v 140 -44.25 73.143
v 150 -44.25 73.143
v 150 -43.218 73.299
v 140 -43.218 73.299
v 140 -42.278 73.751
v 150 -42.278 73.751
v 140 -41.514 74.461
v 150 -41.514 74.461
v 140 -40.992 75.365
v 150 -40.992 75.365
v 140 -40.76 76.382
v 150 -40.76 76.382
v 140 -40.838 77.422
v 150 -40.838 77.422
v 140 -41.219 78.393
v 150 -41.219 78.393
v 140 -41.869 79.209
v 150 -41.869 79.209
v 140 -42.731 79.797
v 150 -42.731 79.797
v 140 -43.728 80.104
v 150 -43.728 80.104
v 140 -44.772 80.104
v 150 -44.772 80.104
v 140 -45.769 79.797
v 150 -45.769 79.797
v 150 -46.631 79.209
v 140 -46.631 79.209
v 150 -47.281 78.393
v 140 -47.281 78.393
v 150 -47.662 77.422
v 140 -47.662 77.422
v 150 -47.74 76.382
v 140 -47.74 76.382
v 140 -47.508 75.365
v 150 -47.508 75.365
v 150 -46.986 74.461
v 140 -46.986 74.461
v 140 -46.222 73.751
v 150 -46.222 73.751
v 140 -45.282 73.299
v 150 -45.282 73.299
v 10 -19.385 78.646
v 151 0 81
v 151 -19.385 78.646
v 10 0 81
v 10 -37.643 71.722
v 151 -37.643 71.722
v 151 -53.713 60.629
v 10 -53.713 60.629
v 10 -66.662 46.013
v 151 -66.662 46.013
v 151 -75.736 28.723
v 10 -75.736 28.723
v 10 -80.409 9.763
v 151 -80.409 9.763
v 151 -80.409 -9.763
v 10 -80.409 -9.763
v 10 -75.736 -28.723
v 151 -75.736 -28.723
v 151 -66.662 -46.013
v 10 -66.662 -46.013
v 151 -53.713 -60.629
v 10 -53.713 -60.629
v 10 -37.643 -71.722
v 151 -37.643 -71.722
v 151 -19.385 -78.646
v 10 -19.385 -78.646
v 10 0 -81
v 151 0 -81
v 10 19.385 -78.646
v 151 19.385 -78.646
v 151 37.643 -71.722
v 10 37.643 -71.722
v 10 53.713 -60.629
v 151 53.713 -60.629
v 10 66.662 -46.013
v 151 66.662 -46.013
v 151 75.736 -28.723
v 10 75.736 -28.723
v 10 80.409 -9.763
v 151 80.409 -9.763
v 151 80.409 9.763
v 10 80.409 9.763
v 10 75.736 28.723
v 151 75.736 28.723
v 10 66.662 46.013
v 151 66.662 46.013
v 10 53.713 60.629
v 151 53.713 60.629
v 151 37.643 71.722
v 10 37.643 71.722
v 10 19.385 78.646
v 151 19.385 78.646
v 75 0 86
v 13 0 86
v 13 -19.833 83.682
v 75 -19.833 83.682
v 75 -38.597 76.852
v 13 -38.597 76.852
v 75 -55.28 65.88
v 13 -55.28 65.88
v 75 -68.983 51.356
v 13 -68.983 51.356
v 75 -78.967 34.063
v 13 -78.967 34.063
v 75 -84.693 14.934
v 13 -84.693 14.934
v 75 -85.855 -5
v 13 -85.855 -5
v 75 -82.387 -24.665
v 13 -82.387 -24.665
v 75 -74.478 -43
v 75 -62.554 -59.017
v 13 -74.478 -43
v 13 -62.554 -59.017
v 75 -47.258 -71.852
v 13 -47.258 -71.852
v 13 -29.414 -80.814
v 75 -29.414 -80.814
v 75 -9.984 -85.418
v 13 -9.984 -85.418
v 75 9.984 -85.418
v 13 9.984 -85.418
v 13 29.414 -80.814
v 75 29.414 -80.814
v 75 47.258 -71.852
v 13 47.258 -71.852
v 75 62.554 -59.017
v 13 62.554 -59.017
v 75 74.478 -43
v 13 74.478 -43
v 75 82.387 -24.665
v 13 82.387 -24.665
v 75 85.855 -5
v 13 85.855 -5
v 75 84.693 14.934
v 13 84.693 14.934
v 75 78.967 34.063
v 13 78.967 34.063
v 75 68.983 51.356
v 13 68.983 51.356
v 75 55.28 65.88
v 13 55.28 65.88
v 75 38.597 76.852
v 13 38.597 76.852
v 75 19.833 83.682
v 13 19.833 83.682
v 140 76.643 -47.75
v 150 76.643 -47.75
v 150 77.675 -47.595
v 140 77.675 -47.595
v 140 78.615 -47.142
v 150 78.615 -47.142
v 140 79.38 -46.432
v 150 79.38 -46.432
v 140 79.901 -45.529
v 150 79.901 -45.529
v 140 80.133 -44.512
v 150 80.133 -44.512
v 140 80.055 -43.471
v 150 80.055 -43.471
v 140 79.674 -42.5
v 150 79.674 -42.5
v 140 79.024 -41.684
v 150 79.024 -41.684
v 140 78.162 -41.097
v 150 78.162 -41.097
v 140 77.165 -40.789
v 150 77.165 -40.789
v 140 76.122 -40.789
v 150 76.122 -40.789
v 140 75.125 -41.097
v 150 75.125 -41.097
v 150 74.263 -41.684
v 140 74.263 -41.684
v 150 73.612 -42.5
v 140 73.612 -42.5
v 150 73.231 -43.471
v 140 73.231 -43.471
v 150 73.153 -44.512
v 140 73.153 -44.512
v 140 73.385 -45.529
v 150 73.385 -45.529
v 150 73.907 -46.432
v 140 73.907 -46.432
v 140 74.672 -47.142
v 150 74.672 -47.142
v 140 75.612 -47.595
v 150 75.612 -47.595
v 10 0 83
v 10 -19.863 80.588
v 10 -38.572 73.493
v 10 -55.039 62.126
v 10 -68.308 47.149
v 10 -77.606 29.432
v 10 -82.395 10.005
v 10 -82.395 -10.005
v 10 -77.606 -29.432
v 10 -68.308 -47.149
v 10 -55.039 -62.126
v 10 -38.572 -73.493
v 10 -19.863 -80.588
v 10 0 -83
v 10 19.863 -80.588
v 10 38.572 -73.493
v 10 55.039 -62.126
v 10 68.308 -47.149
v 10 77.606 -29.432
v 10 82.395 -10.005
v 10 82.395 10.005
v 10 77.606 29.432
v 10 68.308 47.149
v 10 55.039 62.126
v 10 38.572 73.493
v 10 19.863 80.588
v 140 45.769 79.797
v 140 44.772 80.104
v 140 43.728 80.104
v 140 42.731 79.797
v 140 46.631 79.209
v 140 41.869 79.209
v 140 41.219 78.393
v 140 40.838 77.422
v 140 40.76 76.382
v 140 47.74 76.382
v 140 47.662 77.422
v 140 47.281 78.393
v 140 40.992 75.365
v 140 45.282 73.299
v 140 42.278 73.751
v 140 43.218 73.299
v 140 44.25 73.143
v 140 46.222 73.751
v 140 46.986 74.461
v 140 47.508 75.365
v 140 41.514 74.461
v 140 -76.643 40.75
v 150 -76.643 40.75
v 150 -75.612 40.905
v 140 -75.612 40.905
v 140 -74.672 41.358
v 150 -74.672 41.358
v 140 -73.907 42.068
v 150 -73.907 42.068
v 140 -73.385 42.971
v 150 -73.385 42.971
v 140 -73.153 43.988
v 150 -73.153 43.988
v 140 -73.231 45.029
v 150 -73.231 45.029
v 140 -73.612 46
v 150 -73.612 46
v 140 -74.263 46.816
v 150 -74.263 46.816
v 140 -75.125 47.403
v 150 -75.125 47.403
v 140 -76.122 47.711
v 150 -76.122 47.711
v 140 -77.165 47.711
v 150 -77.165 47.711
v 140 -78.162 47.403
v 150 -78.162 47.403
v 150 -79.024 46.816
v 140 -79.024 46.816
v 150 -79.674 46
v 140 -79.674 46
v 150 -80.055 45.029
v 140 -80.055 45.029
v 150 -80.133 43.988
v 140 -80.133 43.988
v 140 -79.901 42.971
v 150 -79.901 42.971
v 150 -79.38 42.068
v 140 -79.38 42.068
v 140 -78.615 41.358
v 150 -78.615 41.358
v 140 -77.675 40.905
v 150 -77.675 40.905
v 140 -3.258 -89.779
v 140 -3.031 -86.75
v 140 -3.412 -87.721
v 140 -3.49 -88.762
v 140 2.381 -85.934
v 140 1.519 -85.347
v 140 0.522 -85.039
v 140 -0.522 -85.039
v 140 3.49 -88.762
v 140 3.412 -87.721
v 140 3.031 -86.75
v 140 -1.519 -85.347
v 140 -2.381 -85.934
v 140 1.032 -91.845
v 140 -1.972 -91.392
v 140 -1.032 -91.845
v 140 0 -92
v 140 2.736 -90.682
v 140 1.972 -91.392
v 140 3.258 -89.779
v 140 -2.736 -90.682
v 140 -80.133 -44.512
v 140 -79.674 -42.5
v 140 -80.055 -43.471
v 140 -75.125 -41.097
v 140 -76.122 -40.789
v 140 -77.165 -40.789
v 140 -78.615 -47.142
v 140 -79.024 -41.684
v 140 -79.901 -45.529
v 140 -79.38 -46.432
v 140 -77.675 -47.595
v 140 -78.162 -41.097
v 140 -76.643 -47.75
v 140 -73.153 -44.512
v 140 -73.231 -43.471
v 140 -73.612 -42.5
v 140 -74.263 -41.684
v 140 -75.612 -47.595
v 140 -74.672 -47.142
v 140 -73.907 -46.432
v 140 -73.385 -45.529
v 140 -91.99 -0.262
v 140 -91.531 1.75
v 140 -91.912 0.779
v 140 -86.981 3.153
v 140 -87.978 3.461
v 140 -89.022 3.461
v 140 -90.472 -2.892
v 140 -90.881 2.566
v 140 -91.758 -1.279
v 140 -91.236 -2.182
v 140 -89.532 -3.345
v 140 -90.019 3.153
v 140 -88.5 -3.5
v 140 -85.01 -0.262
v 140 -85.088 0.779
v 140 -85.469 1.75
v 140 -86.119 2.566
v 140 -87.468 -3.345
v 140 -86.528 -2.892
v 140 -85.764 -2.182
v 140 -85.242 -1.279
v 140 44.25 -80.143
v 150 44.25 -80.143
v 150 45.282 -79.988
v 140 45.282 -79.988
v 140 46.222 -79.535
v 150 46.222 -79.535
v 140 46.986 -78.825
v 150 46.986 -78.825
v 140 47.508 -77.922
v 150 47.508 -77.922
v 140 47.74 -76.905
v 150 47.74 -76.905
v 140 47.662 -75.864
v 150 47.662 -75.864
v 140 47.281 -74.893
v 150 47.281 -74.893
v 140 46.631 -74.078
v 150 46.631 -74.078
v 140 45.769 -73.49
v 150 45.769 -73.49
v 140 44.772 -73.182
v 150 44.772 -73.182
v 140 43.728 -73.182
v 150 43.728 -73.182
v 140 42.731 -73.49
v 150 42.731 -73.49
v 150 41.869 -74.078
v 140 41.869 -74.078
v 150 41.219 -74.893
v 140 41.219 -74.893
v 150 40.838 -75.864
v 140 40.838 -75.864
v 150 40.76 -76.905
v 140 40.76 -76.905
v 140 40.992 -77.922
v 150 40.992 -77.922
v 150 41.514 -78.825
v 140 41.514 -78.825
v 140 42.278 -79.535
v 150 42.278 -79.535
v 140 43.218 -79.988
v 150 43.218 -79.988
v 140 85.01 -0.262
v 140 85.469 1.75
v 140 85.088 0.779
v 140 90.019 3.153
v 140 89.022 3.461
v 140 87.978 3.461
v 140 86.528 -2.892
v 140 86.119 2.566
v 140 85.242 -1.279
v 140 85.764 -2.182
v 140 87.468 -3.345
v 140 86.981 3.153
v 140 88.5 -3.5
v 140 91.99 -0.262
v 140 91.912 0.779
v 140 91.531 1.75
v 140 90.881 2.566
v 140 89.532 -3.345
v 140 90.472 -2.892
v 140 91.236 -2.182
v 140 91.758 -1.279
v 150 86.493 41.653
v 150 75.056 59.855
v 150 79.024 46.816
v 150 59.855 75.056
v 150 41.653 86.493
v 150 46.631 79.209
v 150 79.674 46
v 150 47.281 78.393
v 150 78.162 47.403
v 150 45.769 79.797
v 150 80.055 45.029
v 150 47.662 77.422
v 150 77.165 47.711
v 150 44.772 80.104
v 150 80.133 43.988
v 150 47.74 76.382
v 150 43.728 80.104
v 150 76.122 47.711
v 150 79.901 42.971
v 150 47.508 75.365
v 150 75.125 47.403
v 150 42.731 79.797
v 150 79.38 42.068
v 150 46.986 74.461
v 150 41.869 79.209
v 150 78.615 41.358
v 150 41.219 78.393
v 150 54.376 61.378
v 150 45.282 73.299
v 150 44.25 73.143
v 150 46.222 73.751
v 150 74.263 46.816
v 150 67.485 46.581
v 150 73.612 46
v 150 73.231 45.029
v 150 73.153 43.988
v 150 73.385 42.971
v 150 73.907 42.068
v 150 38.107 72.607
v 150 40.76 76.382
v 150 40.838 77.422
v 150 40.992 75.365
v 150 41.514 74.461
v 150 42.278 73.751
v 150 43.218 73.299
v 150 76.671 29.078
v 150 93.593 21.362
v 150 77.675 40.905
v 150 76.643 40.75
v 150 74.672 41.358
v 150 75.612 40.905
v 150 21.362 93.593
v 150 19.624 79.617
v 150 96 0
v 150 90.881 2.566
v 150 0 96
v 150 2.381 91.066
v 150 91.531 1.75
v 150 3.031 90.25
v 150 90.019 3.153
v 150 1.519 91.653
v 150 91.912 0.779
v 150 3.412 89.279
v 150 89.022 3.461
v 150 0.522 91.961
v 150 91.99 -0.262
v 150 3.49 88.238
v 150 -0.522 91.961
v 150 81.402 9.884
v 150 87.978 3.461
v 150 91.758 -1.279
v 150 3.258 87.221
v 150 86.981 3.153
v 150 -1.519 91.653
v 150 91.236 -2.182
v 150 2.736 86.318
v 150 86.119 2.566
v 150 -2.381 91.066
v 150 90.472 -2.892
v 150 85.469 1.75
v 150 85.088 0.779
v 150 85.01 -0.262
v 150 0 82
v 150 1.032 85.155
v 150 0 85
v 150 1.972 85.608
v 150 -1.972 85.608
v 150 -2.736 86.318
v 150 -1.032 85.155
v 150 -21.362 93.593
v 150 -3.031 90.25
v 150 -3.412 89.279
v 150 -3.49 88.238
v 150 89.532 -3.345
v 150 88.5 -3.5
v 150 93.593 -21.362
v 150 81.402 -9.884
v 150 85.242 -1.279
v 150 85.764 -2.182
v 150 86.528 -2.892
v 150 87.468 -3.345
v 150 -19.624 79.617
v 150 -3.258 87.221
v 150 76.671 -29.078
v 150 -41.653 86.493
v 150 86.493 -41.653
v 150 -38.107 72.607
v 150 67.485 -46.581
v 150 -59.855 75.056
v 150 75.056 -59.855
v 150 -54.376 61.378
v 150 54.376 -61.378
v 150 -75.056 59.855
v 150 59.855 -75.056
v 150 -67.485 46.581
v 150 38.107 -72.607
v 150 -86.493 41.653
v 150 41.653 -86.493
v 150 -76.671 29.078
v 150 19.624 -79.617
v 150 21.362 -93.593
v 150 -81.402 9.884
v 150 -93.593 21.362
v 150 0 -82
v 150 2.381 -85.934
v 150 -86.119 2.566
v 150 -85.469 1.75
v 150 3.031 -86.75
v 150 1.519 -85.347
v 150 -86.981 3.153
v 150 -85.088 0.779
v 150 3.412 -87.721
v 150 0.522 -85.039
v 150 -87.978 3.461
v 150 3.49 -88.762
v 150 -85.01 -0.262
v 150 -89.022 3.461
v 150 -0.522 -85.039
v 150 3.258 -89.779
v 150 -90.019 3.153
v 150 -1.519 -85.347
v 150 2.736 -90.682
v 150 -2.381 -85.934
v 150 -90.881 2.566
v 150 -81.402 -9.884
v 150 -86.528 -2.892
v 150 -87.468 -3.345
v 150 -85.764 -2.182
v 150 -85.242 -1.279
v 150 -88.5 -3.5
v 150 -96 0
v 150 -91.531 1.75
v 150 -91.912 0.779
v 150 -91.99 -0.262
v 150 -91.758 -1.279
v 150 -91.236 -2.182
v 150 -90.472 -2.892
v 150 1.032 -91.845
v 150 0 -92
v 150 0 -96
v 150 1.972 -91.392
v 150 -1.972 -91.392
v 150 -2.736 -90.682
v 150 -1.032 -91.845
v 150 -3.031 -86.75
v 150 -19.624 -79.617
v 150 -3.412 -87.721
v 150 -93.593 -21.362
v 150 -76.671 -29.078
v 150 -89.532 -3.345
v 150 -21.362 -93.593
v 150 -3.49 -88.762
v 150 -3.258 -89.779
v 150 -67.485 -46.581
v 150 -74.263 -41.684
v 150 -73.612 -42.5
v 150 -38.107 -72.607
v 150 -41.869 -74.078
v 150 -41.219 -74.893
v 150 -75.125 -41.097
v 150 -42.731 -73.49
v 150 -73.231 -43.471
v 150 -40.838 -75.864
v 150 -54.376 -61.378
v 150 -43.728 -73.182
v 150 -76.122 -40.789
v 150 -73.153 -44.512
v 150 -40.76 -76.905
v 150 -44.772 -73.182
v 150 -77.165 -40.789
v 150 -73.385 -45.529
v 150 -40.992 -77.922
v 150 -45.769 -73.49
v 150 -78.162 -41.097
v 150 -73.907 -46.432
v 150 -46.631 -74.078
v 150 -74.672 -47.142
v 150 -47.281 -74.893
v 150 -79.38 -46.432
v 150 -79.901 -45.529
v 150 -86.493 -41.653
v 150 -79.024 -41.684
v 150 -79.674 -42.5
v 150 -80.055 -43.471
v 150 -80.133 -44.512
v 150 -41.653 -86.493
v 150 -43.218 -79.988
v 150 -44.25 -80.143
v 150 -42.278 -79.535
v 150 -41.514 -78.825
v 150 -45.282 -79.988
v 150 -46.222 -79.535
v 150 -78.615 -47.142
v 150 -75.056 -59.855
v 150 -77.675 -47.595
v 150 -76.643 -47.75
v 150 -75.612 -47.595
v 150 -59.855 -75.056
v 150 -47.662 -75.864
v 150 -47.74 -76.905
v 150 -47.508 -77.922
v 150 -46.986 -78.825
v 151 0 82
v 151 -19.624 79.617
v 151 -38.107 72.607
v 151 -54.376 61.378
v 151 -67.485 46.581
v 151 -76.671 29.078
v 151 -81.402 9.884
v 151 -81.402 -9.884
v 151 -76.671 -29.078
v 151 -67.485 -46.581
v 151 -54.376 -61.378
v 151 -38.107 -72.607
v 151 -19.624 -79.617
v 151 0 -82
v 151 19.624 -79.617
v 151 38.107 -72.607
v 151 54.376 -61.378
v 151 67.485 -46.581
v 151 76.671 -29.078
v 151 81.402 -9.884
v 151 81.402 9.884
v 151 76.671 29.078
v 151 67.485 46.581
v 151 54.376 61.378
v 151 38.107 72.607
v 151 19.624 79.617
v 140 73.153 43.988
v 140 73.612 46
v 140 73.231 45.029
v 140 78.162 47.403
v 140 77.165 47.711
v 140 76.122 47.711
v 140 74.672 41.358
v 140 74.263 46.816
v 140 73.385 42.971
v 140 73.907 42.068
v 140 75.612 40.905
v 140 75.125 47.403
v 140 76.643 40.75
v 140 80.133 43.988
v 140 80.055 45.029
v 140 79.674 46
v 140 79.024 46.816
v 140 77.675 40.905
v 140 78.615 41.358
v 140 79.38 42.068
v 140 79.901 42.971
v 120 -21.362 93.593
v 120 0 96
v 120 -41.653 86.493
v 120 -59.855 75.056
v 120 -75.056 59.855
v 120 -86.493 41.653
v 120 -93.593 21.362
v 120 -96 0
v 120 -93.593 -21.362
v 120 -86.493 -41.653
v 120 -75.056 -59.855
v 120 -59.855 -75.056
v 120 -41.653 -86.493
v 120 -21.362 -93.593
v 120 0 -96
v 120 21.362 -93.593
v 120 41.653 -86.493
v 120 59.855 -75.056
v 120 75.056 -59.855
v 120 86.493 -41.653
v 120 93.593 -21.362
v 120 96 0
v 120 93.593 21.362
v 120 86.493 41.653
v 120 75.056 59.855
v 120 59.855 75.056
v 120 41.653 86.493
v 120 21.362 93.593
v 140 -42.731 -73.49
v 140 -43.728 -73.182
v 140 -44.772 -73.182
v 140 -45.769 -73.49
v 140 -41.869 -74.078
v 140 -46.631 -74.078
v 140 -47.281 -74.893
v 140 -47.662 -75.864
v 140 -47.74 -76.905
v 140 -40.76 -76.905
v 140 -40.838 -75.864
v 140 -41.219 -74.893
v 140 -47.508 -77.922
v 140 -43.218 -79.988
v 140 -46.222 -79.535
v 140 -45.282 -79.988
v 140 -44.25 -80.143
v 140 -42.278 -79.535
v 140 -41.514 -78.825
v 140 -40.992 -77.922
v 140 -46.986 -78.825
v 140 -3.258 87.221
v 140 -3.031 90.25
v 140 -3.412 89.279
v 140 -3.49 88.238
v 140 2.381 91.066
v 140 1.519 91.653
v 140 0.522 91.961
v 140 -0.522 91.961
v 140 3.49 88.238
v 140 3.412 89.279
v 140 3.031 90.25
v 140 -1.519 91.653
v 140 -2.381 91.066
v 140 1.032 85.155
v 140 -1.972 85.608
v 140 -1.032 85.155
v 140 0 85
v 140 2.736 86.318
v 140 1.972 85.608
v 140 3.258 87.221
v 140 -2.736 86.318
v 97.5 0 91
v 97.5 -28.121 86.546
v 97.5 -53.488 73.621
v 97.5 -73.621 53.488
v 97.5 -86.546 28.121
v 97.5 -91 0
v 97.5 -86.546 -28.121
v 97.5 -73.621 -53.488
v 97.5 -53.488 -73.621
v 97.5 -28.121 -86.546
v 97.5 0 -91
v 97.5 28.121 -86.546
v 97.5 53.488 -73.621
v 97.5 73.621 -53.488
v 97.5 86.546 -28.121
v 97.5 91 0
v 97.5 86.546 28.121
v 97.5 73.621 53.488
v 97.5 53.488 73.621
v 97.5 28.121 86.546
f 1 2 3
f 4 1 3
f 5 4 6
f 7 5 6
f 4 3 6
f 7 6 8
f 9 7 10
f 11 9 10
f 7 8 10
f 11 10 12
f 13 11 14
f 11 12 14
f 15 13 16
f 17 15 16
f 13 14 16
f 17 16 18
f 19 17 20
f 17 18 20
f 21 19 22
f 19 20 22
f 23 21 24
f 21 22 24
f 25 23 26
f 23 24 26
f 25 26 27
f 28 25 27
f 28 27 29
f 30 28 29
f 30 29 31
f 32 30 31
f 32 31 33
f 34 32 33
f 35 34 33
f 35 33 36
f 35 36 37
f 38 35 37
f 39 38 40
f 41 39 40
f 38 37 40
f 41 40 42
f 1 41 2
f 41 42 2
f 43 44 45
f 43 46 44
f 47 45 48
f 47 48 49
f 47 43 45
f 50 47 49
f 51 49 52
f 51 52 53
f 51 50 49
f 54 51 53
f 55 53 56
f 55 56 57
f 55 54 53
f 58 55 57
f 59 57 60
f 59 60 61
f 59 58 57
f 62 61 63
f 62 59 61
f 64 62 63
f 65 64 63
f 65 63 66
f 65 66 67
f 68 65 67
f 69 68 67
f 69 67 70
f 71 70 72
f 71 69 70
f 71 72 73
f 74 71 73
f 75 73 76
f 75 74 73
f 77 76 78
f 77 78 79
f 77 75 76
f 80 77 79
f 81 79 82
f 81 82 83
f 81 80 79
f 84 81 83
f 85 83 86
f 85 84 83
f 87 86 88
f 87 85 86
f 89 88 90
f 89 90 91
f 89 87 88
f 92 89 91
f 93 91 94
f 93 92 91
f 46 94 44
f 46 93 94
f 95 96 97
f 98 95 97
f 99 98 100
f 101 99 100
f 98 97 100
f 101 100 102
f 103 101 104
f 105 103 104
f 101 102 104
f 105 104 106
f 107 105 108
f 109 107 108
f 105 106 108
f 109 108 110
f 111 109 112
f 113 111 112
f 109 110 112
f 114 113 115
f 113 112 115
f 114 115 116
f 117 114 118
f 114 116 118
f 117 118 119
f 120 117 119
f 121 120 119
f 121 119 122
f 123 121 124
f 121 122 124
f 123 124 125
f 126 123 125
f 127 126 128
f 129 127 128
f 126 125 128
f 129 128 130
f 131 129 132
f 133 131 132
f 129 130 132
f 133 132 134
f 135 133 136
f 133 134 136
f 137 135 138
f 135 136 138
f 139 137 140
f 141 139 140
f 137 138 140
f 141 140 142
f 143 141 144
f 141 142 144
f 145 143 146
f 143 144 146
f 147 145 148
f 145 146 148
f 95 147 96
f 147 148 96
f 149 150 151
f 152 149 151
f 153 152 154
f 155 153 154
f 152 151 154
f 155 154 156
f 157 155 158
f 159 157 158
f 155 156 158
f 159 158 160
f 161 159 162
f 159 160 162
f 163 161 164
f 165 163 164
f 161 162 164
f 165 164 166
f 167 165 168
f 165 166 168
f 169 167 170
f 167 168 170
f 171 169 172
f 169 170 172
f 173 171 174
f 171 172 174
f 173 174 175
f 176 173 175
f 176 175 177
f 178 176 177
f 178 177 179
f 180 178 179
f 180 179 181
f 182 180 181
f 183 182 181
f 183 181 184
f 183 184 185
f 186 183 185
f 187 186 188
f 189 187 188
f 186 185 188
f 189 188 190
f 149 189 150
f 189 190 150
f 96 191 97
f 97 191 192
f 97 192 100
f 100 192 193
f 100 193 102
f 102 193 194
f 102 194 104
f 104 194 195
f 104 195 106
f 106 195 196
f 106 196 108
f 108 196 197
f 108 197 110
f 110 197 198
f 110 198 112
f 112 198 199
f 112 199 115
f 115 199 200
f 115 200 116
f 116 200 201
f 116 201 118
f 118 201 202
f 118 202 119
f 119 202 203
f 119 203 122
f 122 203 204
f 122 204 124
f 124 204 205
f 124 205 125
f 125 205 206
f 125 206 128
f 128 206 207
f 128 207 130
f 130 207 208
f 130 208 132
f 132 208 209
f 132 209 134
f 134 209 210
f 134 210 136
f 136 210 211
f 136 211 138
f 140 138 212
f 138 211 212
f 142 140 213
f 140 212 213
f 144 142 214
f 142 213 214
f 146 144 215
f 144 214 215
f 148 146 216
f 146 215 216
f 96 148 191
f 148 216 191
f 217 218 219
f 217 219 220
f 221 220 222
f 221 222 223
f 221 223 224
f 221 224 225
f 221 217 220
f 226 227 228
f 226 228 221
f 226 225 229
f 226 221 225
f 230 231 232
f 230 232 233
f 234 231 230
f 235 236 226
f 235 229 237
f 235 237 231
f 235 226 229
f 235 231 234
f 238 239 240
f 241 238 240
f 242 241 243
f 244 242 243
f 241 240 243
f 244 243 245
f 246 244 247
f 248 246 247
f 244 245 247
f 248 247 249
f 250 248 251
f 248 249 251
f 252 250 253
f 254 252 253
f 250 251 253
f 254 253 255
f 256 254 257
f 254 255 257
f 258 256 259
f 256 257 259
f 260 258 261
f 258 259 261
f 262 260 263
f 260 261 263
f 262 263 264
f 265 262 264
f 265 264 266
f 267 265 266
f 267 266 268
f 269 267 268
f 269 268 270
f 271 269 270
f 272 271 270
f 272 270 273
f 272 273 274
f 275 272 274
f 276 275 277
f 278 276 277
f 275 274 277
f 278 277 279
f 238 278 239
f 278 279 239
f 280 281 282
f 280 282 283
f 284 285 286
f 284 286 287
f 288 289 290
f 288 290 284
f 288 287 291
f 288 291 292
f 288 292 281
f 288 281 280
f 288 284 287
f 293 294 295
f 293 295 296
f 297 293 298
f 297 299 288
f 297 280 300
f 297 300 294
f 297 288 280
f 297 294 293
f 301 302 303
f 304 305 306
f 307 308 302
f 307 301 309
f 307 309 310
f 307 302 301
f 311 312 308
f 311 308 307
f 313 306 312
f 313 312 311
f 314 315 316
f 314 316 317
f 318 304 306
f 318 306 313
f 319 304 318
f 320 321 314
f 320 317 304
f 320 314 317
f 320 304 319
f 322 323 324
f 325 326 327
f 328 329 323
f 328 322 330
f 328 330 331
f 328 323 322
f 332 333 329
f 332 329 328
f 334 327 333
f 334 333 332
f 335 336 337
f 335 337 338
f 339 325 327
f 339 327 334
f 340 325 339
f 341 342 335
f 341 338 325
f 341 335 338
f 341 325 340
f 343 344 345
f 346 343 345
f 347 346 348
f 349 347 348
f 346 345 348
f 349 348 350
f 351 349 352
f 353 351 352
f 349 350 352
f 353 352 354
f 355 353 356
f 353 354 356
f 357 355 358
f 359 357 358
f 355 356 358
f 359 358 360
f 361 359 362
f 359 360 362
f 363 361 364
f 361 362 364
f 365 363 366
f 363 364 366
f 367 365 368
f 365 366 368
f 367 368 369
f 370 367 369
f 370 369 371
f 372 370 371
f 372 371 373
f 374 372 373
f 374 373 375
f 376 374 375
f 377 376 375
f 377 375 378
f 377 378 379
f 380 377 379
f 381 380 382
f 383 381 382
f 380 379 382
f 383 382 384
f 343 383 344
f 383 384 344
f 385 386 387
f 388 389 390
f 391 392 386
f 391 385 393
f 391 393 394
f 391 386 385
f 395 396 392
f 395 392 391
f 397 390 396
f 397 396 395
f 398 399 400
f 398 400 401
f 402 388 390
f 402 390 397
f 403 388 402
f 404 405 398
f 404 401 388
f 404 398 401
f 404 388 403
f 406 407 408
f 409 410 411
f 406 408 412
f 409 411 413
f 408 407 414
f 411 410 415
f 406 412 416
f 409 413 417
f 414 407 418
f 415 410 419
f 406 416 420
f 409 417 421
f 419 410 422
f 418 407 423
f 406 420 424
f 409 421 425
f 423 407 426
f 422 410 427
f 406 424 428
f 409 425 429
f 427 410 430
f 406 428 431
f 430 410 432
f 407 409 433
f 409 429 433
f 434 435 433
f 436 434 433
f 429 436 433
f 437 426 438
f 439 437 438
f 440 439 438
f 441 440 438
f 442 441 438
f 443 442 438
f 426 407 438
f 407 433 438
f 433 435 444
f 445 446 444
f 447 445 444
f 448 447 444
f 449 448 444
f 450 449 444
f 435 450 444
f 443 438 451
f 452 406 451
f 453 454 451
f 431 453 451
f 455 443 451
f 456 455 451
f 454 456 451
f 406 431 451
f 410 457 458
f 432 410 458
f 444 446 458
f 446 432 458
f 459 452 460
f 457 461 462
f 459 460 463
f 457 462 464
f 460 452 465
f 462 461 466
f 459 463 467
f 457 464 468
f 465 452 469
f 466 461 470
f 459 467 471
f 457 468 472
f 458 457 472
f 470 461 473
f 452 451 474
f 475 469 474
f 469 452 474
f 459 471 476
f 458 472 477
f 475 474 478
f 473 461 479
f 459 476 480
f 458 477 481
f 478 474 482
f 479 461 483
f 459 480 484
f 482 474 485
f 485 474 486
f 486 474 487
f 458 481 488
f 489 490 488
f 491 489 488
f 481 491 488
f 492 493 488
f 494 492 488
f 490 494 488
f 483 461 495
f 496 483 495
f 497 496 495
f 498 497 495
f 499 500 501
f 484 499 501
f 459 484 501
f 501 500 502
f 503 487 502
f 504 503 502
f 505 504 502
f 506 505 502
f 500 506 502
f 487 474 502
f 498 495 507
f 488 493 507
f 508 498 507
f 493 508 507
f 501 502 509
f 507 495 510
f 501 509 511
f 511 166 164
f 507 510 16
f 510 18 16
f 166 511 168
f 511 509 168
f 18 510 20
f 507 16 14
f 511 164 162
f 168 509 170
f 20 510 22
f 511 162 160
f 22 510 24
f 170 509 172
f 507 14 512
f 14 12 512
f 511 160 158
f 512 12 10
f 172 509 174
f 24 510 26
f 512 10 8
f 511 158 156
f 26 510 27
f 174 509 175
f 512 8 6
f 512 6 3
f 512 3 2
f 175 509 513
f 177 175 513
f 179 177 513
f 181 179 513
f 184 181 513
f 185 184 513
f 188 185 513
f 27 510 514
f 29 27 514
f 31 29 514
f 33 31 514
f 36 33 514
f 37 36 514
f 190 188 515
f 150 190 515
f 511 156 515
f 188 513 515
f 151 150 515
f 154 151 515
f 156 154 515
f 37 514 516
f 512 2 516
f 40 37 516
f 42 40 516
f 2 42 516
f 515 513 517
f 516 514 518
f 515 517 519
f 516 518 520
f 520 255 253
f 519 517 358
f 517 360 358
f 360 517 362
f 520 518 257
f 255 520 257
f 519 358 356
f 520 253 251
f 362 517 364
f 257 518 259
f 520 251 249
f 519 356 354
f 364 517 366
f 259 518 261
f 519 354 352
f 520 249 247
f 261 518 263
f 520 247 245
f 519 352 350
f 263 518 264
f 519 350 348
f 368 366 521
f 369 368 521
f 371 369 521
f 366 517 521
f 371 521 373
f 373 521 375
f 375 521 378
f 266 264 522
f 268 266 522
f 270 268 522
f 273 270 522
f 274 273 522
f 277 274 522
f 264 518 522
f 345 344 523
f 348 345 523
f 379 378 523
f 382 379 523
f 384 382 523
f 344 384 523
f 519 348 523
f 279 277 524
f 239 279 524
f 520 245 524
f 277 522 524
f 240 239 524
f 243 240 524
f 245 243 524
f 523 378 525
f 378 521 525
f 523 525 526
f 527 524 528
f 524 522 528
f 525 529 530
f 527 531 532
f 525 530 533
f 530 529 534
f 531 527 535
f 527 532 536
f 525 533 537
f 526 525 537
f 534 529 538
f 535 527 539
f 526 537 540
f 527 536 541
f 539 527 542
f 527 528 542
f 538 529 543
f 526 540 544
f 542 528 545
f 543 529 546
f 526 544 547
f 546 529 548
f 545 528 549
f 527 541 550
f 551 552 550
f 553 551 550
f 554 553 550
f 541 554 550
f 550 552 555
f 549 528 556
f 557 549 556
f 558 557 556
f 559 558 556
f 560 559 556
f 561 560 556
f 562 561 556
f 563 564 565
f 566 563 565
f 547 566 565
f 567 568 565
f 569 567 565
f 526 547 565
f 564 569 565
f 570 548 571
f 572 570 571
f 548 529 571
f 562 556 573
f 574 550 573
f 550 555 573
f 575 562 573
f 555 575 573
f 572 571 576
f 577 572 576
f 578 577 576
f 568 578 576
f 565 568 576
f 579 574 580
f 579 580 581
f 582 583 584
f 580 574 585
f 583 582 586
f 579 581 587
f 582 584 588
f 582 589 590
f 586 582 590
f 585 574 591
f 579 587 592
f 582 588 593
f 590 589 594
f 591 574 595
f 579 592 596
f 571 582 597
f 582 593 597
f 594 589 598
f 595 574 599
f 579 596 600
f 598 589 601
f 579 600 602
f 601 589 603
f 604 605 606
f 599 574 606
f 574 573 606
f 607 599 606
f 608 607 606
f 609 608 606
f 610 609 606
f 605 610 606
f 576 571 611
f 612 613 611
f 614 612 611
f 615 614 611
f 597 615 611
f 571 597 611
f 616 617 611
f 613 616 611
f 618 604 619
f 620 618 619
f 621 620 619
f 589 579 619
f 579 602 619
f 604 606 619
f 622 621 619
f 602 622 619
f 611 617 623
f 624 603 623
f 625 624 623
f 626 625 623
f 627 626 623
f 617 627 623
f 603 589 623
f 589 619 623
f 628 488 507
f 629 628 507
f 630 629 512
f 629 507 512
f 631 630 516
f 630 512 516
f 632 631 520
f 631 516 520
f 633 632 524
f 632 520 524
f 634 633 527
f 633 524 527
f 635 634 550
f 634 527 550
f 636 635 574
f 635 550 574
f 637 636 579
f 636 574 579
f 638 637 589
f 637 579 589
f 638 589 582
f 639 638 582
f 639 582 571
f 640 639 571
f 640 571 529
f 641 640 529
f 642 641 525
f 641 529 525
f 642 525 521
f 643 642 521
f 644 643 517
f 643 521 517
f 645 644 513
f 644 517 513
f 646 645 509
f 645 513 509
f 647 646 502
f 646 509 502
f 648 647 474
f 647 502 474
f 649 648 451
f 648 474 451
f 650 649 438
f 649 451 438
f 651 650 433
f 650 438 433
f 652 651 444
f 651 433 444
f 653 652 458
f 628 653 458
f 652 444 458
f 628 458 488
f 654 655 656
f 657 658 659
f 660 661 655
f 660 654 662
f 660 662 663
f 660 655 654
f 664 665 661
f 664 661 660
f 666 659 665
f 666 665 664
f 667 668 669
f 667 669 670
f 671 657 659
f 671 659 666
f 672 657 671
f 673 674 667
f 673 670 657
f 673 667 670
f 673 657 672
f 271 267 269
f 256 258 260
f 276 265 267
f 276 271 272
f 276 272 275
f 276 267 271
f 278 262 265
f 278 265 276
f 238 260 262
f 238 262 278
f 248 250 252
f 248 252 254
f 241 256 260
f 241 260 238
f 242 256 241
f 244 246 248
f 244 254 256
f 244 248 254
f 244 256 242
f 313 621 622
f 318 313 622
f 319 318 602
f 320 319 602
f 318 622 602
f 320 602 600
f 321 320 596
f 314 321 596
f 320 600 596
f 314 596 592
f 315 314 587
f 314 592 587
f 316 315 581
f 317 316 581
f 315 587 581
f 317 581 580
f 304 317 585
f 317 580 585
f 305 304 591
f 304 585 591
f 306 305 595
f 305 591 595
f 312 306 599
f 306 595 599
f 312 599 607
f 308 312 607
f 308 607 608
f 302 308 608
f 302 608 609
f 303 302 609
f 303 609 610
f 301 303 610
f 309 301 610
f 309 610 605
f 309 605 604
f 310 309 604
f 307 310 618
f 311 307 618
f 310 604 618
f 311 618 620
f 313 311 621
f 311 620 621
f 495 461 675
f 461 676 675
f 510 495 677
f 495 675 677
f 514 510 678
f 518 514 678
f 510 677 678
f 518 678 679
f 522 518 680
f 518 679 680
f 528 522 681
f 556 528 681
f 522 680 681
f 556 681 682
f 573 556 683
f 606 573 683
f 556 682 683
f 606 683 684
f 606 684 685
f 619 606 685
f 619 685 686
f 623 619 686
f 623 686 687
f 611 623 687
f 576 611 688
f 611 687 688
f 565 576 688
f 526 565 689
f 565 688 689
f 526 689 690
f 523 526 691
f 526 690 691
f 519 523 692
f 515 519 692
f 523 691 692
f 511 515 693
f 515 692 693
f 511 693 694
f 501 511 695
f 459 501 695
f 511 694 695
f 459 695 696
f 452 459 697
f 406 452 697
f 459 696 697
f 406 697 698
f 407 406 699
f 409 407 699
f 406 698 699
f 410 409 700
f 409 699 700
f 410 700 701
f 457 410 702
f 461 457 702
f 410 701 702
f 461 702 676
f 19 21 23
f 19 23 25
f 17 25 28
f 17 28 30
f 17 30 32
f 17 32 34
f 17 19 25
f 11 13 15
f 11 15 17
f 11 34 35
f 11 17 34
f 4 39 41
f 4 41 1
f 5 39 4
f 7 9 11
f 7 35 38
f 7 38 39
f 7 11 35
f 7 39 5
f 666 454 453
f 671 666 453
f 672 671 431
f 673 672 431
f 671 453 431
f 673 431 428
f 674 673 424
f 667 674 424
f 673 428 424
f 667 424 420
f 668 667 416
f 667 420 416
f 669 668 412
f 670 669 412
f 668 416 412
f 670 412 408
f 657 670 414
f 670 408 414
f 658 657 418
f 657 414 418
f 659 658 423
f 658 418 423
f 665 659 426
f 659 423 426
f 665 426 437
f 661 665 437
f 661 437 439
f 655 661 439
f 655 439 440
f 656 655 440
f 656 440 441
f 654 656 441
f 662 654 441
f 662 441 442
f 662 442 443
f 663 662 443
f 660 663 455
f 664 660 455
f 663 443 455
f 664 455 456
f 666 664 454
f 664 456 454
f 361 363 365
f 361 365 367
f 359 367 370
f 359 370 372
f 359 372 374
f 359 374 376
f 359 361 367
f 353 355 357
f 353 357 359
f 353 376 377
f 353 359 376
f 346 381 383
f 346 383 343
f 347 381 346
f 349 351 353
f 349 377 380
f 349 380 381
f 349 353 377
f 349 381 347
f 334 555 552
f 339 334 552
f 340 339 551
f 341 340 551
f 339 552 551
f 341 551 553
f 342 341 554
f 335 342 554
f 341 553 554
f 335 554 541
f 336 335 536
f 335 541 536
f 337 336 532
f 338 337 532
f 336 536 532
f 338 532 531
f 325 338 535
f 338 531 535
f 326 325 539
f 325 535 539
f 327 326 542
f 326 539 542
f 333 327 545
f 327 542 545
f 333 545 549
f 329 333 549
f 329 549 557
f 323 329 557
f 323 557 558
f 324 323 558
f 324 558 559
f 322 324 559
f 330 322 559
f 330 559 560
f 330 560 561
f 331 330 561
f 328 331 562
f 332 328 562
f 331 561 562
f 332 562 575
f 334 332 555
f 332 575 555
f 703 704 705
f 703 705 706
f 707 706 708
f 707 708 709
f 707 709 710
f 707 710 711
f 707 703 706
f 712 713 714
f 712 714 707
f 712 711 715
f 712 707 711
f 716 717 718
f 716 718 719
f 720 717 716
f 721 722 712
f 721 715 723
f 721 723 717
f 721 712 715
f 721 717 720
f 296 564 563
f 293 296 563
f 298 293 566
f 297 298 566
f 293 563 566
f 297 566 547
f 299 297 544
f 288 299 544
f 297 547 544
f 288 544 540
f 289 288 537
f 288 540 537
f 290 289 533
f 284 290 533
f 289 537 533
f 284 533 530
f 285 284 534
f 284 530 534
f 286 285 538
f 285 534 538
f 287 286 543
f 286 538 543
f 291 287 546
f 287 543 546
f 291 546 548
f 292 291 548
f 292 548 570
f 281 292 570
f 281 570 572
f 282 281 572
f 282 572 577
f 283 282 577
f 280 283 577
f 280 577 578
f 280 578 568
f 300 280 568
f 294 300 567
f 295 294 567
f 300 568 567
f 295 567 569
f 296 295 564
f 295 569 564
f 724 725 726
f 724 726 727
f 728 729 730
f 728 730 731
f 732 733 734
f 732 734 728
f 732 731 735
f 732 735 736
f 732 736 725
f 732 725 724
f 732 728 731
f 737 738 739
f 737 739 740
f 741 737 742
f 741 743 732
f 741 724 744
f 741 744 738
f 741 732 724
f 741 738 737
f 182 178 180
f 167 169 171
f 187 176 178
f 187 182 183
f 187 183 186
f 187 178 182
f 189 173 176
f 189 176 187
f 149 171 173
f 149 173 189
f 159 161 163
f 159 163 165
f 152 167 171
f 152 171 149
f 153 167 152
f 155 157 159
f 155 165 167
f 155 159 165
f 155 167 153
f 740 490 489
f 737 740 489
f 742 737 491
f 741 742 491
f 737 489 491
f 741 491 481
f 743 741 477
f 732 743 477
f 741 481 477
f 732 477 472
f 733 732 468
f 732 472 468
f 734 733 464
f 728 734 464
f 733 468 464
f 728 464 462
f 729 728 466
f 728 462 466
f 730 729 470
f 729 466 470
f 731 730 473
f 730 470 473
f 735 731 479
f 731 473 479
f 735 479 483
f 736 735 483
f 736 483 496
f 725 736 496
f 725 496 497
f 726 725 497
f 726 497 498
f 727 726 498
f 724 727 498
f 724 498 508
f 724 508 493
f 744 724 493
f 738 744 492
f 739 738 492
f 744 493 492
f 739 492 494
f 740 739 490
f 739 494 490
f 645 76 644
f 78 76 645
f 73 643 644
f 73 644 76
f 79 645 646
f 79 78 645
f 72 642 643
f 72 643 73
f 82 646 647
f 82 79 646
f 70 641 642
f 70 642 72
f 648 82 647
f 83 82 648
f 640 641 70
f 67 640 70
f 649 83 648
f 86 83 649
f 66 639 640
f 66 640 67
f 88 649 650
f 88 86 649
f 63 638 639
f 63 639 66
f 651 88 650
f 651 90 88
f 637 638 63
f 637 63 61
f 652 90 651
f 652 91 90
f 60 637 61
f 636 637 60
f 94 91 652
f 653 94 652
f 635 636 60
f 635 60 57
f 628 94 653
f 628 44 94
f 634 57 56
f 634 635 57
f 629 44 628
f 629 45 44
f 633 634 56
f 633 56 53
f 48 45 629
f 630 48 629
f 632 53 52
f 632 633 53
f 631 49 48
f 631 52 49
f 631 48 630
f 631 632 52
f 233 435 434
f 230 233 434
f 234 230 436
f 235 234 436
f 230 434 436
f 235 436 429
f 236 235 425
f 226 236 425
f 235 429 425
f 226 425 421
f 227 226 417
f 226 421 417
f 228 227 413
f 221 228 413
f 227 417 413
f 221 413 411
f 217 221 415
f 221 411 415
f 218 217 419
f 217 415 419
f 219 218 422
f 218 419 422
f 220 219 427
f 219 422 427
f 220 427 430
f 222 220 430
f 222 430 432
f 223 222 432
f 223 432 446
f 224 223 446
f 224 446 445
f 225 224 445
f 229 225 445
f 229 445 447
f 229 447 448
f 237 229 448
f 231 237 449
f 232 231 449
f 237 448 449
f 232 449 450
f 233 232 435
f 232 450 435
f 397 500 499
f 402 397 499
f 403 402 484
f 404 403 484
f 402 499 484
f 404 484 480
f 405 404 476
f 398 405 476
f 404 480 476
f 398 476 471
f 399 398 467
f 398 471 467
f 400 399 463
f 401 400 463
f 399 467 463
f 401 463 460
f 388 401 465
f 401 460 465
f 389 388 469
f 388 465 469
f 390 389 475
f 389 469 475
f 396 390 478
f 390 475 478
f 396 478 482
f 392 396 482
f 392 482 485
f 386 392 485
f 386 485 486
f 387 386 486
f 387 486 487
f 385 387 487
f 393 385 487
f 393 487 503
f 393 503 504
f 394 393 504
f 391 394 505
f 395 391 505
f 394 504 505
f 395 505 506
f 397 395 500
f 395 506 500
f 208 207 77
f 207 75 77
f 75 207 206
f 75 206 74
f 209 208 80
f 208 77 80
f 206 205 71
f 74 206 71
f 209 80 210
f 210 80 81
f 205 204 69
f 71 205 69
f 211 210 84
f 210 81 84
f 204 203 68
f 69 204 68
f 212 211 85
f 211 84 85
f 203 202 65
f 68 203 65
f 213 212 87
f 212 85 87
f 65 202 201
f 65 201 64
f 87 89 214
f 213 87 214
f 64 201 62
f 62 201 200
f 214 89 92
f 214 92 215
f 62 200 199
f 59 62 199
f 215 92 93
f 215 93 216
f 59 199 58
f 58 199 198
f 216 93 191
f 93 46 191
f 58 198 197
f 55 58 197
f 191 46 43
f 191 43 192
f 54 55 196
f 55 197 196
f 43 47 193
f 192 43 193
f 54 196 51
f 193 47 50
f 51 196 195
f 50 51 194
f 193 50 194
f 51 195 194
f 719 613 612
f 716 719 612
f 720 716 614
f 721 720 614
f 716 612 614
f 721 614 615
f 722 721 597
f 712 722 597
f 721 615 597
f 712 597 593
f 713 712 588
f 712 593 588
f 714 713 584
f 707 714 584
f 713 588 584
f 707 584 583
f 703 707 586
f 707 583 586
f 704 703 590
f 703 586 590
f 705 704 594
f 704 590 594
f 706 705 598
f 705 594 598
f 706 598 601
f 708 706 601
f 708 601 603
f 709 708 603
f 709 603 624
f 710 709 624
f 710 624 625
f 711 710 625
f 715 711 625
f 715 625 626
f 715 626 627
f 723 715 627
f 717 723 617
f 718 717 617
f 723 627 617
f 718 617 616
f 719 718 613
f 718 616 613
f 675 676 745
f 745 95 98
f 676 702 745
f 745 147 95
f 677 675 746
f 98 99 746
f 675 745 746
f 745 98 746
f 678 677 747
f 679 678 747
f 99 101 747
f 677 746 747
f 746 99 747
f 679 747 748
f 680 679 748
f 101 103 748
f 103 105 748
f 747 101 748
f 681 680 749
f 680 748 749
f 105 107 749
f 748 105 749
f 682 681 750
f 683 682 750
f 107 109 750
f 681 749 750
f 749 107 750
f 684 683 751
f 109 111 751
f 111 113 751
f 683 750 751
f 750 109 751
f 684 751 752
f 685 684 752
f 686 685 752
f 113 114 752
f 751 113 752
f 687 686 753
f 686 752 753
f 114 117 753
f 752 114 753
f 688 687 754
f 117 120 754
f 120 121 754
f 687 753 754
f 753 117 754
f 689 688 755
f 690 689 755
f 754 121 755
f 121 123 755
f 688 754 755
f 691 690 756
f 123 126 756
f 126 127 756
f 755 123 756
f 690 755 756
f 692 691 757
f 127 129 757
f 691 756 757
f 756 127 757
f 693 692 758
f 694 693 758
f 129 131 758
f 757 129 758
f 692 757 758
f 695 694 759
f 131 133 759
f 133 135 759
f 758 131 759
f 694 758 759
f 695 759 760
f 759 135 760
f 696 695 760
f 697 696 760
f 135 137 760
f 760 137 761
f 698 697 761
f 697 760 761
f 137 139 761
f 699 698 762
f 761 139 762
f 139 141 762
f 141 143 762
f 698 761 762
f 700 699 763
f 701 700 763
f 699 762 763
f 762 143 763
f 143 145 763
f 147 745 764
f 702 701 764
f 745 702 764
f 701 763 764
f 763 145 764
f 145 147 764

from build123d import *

# Parameters (mm, degrees)
CHAMFER_2_SIZE      = 3
SKETCH_4_R          = 3.5
CUT_EXTRUDE_1_DEPTH = 10
SKETCH_5_R          = 82
SKETCH_5_R_2        = 81
EXTRUDE_1_DEPTH     = 1


with BuildPart() as part:
    # 草图2 → 旋转1 (revolve)
    with BuildSketch(Plane.XY, mode=Mode.PRIVATE) as revolve_1_sk:
        Polygon((10, 81), (150, 81), (150, 86), (150, 96), (120, 96), (75, 86), (10, 86), align=None)
    revolve(revolve_1_sk.sketch.rotate(Axis((0, 0, 0), (1, 0, 0)), 90), axis=Axis((0, 0, 0), (1, 0, 0)))

    # 倒角2
    chamfer_2_edges = [part.edges().sort_by_distance(p)[0] for p in [
        (10, 0, -86),
    ]]
    chamfer(chamfer_2_edges, length=CHAMFER_2_SIZE)

    # 草图4 → 切除-拉伸1 (cut)
    with BuildSketch(Plane(origin=(150, 0, 0), x_dir=(0, 0, -1), z_dir=(1, 0, 0))):
        with Locations((44.25, 76.643248235)):
            Circle(SKETCH_4_R)
        with Locations((0, 88.5)):
            Circle(SKETCH_4_R)
        with Locations((76.643248235, 44.25)):
            Circle(SKETCH_4_R)
        with Locations((88.5, 0)):
            Circle(SKETCH_4_R)
        with Locations((76.643248235, -44.25)):
            Circle(SKETCH_4_R)
        with Locations((44.25, -76.643248235)):
            Circle(SKETCH_4_R)
        with Locations((0, -88.5)):
            Circle(SKETCH_4_R)
        with Locations((-44.25, -76.643248235)):
            Circle(SKETCH_4_R)
        with Locations((-76.643248235, -44.25)):
            Circle(SKETCH_4_R)
        with Locations((-88.5, 0)):
            Circle(SKETCH_4_R)
        with Locations((-76.643248235, 44.25)):
            Circle(SKETCH_4_R)
        with Locations((-44.25, 76.643248235)):
            Circle(SKETCH_4_R)
    extrude(amount=-CUT_EXTRUDE_1_DEPTH, mode=Mode.SUBTRACT)

    # 草图5 → 凸台-拉伸1 (add)
    with BuildSketch(Plane(origin=(150, 0, 0), x_dir=(0, 0, -1), z_dir=(1, 0, 0))):
        with Locations(Location((0, 0, 0), (0, 0, 180))):
            Circle(SKETCH_5_R)
        with Locations(Location((0, 0, 0), (0, 0, 180))):
            Circle(SKETCH_5_R_2, mode=Mode.SUBTRACT)
    extrude(amount=EXTRUDE_1_DEPTH)


solid = part.part
